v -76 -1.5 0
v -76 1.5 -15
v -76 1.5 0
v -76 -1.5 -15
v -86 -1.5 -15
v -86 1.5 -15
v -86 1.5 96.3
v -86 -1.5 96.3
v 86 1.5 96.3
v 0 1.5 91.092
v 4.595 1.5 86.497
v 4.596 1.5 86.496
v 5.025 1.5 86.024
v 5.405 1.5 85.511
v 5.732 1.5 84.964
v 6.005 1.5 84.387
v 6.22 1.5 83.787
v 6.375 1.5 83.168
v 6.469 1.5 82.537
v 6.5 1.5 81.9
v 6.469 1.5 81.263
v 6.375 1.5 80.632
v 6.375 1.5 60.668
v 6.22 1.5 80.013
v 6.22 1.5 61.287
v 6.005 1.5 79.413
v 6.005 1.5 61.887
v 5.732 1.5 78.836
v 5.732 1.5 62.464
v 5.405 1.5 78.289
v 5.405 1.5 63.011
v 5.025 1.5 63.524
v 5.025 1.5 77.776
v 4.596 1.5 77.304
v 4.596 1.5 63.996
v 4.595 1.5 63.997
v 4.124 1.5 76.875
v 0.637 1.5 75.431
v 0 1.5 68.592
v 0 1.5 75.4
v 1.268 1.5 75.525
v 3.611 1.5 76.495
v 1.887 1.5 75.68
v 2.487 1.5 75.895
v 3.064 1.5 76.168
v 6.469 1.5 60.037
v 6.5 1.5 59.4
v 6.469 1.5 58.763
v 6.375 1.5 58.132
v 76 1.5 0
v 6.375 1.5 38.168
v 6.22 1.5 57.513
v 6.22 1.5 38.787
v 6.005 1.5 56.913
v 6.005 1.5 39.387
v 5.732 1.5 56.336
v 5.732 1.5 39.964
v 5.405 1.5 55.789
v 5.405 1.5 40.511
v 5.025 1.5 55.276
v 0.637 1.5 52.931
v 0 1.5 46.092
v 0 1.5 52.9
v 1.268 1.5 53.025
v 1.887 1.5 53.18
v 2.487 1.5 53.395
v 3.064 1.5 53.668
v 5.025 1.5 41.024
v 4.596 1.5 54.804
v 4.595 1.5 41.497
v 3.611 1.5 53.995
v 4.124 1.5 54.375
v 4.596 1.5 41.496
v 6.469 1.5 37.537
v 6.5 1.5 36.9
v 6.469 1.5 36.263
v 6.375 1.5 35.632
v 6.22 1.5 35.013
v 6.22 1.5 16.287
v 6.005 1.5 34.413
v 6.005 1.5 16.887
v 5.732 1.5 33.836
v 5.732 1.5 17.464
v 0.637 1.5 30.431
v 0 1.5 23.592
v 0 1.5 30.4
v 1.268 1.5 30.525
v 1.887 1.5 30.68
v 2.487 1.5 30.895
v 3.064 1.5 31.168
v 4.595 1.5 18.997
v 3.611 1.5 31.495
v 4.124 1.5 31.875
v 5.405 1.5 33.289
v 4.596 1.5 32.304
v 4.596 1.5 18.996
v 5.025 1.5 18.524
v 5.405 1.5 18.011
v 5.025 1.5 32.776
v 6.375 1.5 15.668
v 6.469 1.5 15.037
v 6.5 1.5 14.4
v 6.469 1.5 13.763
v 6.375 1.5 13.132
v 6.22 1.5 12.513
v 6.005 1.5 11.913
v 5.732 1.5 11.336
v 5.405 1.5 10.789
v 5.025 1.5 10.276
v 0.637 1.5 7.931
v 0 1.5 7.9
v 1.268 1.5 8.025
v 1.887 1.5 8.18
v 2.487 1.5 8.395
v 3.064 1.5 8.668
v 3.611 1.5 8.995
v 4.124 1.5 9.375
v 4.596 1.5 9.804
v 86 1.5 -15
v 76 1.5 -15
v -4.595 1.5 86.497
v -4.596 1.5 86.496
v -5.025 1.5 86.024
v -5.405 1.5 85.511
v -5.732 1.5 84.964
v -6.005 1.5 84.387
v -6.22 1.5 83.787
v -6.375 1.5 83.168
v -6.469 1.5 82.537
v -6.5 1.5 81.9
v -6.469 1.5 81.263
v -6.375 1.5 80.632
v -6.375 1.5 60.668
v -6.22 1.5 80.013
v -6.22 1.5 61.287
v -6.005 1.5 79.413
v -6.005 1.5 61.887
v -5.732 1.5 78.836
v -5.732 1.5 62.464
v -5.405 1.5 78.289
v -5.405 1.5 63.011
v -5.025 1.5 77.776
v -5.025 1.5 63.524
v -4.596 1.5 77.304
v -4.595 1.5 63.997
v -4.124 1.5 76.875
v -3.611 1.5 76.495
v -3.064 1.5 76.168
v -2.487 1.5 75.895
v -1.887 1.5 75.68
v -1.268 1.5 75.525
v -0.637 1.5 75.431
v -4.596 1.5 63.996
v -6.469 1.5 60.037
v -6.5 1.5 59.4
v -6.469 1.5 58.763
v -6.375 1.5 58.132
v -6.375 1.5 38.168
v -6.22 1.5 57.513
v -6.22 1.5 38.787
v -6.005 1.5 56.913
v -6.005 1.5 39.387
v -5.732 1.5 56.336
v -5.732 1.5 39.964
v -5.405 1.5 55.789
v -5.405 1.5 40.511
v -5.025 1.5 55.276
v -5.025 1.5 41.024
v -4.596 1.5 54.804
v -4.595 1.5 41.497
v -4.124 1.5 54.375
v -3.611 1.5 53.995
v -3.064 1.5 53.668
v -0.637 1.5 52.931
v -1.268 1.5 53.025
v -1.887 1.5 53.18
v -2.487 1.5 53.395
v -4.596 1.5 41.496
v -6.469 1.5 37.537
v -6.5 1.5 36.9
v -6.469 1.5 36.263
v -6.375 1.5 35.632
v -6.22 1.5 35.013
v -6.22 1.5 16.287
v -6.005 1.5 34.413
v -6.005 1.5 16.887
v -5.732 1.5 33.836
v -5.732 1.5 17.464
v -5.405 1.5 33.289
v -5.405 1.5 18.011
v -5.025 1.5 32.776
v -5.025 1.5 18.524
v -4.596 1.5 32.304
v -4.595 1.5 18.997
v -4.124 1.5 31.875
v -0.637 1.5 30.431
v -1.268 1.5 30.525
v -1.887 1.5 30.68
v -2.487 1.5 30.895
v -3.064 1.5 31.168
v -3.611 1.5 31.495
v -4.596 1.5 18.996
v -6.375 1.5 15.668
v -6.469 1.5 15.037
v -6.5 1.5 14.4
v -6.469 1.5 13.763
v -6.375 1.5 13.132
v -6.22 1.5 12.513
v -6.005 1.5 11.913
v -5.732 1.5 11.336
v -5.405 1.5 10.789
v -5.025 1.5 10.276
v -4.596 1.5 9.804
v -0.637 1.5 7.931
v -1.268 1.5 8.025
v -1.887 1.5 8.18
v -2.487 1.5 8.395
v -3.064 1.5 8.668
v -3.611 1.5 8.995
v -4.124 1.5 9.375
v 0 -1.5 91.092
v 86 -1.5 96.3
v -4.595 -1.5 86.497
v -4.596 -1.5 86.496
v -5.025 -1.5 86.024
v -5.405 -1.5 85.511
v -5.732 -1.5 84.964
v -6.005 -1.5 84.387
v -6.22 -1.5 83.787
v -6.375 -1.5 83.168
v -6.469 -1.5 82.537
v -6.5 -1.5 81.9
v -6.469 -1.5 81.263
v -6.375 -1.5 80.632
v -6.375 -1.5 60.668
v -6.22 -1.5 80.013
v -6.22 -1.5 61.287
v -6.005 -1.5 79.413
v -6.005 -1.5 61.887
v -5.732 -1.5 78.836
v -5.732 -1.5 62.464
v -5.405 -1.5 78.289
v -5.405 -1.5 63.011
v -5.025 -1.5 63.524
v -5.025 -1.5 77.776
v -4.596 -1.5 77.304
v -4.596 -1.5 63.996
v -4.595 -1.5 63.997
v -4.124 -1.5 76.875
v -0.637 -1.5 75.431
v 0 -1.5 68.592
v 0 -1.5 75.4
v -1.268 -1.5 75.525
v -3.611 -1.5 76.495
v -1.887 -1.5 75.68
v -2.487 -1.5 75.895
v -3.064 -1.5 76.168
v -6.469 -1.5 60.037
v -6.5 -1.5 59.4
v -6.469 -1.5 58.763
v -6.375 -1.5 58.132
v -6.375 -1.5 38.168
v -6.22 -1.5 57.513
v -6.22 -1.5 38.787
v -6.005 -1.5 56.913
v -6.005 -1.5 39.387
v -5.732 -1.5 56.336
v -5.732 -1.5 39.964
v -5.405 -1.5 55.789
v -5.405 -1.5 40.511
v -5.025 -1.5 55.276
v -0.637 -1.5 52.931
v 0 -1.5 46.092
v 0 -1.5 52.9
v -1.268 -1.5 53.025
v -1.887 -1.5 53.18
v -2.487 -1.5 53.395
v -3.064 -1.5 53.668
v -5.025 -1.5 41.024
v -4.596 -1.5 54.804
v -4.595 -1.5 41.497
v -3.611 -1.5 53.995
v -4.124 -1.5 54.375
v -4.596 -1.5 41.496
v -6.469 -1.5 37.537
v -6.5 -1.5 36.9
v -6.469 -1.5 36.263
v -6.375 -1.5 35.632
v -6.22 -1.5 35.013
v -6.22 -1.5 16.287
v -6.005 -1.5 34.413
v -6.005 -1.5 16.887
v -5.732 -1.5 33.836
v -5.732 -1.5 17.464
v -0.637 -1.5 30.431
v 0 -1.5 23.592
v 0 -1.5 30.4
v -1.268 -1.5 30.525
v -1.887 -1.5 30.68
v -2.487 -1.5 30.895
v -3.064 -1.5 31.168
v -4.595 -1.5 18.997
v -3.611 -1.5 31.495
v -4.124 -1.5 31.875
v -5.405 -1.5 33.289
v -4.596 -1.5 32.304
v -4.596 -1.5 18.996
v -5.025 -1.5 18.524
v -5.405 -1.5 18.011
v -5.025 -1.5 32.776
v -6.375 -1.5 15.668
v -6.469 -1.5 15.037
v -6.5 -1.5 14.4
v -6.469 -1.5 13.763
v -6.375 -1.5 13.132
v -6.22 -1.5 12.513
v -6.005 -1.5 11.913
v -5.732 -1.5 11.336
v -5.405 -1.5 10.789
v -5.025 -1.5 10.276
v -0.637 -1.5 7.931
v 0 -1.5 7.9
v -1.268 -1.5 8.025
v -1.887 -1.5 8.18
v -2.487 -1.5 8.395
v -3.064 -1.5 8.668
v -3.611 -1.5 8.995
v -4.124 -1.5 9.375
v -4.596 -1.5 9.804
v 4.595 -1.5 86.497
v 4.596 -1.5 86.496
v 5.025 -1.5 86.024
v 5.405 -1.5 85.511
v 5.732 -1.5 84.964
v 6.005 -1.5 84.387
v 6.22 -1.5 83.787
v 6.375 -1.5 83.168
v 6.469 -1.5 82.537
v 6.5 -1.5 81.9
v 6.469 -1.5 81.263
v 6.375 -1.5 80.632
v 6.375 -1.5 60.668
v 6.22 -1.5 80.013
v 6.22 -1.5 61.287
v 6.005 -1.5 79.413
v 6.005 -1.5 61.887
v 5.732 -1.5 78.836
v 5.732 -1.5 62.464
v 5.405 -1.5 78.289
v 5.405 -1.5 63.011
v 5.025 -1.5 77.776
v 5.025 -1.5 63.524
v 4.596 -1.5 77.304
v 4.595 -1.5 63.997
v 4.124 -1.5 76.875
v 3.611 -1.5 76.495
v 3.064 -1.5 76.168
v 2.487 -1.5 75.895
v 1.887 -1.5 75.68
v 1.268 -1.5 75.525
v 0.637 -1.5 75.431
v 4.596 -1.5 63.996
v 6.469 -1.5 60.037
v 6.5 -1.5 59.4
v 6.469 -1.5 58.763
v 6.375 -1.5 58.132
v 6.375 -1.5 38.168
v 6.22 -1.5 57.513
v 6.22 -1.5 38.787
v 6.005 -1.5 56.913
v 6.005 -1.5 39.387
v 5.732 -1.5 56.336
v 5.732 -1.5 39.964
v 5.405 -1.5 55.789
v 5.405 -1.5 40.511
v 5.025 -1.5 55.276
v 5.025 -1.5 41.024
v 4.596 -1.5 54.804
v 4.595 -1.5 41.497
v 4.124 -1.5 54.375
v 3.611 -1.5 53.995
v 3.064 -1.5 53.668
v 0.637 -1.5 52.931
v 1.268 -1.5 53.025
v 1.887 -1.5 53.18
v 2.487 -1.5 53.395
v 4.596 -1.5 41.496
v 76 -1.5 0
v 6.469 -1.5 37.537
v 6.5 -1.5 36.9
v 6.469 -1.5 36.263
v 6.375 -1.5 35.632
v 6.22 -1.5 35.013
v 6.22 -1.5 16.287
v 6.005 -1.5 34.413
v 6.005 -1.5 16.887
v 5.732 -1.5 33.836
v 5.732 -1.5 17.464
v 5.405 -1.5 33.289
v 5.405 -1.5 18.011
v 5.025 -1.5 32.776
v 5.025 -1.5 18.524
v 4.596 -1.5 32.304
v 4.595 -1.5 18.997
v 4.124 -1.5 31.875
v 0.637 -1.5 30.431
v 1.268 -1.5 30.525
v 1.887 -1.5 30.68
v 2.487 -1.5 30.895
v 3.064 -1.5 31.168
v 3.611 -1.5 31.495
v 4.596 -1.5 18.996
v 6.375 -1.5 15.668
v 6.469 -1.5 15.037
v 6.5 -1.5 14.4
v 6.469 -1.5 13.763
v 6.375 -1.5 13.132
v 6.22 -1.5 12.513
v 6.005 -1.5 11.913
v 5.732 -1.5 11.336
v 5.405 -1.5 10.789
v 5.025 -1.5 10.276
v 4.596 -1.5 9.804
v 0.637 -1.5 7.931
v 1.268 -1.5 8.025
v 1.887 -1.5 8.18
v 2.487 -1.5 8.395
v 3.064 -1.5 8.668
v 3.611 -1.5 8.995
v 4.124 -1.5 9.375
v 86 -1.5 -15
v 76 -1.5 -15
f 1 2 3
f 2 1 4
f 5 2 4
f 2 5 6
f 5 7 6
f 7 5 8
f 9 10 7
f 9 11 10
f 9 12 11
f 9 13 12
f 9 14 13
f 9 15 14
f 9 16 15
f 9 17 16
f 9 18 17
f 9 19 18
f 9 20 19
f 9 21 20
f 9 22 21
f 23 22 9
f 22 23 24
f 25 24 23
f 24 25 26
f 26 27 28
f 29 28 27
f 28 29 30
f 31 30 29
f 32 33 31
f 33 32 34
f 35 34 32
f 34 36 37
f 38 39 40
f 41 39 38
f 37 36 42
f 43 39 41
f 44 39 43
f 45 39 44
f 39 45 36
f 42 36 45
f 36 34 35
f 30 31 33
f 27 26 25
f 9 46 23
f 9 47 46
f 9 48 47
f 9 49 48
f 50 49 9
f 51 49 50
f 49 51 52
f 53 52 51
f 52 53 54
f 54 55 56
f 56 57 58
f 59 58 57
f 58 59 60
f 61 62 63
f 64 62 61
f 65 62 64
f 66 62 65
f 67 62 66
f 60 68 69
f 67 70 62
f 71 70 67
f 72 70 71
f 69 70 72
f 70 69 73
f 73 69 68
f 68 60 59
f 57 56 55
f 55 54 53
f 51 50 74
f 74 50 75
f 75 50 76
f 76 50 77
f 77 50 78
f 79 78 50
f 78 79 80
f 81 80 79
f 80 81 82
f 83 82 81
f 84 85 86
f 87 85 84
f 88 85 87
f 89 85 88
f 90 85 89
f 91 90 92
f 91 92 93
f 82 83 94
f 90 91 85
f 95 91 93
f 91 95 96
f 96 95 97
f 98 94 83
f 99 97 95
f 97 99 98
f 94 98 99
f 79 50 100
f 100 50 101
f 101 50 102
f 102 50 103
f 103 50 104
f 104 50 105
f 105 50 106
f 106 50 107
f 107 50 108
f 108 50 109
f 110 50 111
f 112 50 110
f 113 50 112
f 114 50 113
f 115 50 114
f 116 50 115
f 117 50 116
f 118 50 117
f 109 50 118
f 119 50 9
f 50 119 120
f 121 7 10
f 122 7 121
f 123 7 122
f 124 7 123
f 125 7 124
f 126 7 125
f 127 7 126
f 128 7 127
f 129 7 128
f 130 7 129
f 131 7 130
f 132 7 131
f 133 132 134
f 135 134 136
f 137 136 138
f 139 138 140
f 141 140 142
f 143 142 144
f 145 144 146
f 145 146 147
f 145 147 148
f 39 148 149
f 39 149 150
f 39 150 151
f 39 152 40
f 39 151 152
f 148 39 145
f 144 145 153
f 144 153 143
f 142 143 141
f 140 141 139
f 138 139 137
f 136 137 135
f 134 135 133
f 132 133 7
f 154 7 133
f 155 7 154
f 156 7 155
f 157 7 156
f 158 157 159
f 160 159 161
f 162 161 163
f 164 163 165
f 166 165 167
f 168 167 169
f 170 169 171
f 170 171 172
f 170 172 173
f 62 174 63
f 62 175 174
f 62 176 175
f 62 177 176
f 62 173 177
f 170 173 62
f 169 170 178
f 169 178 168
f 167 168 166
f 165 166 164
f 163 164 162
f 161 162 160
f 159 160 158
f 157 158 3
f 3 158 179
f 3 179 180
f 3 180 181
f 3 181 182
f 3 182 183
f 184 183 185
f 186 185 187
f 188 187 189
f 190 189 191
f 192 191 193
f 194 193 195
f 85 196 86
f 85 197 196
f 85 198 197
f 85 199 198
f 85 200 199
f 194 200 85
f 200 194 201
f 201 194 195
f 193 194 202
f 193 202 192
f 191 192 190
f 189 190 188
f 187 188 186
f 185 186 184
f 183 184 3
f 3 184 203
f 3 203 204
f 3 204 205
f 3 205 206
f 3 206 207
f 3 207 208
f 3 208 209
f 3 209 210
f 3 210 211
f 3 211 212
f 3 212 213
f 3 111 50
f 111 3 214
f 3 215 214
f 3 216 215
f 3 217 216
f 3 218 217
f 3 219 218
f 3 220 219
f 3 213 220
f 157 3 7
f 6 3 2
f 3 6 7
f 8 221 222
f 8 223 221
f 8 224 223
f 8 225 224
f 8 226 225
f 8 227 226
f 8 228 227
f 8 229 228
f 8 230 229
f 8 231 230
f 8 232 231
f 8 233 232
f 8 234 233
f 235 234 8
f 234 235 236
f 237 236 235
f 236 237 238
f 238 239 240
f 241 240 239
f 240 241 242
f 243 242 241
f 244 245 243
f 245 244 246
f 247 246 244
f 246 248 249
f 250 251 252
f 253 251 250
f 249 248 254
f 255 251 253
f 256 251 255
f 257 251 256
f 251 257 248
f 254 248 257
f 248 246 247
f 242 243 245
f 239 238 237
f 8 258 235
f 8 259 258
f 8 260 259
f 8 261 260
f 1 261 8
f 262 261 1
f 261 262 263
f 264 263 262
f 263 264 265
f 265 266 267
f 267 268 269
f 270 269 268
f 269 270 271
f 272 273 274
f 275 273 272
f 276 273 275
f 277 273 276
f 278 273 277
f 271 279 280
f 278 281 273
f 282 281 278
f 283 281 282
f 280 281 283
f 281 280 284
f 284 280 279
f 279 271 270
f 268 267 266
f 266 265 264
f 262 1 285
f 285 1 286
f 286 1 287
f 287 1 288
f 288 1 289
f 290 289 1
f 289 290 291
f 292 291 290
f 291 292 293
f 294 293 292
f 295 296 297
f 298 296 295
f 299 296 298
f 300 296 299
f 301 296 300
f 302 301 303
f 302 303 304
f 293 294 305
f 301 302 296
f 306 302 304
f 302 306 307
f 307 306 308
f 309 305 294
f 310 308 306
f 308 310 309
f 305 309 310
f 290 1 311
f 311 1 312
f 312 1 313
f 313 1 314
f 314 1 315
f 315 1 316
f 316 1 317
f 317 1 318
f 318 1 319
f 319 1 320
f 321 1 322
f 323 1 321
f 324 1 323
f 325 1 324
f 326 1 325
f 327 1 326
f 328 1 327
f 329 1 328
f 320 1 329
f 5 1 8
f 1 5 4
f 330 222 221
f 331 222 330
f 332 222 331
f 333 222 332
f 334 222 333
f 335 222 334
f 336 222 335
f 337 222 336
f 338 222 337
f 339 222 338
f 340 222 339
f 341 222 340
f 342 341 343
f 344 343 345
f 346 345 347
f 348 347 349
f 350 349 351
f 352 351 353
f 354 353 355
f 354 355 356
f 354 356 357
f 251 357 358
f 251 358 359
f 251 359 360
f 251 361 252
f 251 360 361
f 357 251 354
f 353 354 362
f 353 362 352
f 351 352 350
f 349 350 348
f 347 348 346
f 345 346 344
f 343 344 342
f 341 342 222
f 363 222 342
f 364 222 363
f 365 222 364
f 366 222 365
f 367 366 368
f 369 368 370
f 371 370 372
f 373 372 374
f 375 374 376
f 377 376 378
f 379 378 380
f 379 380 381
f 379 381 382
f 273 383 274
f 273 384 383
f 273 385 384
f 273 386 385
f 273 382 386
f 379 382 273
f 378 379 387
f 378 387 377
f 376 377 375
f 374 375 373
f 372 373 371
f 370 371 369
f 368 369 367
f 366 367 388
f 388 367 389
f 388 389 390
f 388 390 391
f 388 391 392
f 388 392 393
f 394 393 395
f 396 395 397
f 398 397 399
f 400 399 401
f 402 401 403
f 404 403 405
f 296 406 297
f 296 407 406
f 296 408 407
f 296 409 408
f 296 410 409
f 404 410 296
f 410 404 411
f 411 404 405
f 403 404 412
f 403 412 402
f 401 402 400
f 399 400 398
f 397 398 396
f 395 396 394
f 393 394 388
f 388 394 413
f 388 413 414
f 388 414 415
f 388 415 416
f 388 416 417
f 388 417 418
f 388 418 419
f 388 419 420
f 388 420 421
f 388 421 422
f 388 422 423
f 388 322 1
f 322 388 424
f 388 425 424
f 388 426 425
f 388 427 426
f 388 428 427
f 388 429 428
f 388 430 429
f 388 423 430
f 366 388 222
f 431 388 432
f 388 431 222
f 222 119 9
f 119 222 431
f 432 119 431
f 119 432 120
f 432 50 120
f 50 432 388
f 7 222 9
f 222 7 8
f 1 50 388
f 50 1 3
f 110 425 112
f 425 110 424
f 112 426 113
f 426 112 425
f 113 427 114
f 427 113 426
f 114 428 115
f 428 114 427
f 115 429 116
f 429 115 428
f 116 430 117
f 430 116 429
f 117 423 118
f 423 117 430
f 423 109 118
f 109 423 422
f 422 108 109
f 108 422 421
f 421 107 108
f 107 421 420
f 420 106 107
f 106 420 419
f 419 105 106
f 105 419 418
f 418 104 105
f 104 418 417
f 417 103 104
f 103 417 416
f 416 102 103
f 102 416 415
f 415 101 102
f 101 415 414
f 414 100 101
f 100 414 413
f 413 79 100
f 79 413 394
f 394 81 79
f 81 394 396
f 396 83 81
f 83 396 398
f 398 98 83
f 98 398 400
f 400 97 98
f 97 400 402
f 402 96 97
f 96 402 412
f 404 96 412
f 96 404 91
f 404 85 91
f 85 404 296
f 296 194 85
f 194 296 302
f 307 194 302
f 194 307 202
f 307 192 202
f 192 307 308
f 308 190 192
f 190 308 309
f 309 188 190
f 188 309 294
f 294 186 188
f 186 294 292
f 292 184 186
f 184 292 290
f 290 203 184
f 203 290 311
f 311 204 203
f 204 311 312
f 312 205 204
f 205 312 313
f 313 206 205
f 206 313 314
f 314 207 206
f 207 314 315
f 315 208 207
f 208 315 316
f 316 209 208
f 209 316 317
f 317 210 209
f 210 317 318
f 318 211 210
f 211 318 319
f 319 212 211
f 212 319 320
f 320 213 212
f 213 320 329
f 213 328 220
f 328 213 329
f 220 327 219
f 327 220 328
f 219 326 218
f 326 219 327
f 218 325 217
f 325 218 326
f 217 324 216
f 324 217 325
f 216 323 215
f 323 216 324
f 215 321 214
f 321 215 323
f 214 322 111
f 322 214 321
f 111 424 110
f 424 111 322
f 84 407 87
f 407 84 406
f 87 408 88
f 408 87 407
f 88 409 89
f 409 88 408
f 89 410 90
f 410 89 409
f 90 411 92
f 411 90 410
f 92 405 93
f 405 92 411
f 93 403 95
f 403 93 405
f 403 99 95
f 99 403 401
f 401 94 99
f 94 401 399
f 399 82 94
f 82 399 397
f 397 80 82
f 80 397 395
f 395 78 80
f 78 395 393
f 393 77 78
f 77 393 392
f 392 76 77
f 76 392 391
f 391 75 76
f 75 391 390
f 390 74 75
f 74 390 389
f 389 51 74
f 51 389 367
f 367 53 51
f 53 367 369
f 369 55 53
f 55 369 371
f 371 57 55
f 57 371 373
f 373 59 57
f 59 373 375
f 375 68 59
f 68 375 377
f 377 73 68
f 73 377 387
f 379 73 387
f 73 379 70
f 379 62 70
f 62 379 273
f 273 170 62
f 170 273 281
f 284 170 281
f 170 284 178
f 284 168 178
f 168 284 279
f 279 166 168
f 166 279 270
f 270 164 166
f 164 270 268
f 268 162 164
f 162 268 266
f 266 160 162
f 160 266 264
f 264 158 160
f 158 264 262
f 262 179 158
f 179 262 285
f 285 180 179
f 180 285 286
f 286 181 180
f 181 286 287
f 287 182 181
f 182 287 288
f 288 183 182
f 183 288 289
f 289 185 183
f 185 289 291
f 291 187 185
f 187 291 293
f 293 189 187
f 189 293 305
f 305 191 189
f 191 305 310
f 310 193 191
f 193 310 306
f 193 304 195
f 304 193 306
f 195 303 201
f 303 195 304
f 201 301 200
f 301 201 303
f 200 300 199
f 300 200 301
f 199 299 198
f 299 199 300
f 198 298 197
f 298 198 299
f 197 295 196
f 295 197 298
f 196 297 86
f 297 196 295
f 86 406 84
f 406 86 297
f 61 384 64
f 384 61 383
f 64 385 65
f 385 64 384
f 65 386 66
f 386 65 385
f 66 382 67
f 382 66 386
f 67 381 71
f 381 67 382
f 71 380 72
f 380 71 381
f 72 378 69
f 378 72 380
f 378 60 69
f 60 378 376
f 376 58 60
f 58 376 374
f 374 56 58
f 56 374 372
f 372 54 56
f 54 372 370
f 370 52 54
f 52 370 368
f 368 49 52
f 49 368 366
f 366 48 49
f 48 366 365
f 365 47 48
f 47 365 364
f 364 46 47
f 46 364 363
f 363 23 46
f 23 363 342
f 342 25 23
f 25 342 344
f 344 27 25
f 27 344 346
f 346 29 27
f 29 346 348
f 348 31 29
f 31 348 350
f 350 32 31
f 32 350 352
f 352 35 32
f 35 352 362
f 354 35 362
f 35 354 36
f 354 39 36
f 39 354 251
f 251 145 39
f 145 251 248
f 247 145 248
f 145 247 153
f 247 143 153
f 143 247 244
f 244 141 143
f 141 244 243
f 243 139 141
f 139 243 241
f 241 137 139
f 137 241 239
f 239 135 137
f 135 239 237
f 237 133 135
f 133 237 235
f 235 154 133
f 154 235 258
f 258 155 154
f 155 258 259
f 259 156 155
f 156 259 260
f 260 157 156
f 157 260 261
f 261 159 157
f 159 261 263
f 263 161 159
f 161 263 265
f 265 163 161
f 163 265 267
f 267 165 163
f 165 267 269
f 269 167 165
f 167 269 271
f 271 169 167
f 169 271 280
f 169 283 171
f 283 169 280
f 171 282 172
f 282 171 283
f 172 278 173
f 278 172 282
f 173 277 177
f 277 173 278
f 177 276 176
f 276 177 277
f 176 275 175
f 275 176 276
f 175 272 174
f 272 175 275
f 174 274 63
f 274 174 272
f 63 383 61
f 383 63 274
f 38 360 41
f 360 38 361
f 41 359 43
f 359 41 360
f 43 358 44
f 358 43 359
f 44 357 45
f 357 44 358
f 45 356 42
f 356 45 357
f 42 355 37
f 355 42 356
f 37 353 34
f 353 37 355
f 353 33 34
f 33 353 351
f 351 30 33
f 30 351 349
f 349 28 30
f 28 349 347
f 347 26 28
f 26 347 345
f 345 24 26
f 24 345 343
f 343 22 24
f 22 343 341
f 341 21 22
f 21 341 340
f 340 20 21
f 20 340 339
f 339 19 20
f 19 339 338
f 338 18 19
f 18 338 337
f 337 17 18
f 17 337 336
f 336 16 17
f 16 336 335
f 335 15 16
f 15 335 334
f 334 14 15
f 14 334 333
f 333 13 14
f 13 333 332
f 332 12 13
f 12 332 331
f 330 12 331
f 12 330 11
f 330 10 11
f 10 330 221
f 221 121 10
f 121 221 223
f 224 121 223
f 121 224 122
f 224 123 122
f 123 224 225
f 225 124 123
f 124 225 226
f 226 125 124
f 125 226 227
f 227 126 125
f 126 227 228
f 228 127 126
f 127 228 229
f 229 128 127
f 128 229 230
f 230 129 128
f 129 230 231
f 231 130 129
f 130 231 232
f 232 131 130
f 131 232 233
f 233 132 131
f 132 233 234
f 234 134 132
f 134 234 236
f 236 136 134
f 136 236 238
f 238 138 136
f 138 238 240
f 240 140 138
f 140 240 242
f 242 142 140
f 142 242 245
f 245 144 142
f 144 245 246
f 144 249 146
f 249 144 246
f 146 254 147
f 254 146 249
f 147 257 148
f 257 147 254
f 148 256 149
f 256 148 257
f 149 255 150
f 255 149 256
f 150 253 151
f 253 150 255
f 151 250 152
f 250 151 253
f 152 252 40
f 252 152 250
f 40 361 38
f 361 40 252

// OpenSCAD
// file: common.scad
// ============================================================
// common.scad — shared parameters + modules for all designs
// LOCKED PEN SPECIFICATION (do not change)
// ============================================================
PEN_L = 165;      // pen length (mm)
PEN_A = 17;       // pen cross-section minor
PEN_B = 20;       // pen cross-section major (used as diameter envelope)
CLEAR = 0.4;      // fit clearance
WALL  = 1.6;      // minimum wall thickness

$fn = 64;

RCH = PEN_B/2 + CLEAR;   // = 10.4  channel radius
EPS = 0.01;

// --- open-top U trough cut, axis along X, centered at local origin -----------
// Removes a lower half-cylinder of radius r plus a full-width vertical slot
// upward, so the channel is open at the top (no ceiling -> no overhang).
module trough_cut(len, r=RCH, top=80) {
    union() {
        rotate([0,90,0]) cylinder(h=len, r=r, center=true);
        translate([0,0,top/2]) cube([len, 2*r, top], center=true); // slot upward
    }
}

// --- teardrop hole, axis along X, centered at local origin --------------------
// 45-degree self-supporting apex pointing +Z so a horizontal bore can print
// without support.
module teardrop_cut(len, r=RCH) {
    rotate([0,90,0])
        linear_extrude(height=len, center=true)
            union() {
                circle(r=r);
                polygon([[ 0.7071*r, 0.7071*r],
                         [ 0,         1.4142*r],
                         [-0.7071*r,  0.7071*r]]);
            }
}

// --- dial relief: widened open-top pocket at one channel end -----------------
// place at the +X or -X end of a channel so the dose dial clears / can be turned
module dial_relief(end_x, r=RCH+2.2, len=28, top=80) {
    translate([end_x, 0, 0]) trough_cut(len, r, top);
}
// file: gate_lib.scad
// gate_lib.scad — two-part front-removable rack: open cradle BODY + lift-off GATE
// The body is a reclined ramp with open grooves; pens pull straight out the
// front. A slim gate drops into a catch at each end and spans the front, blocking
// the pens until you lift it off. Everything is a loose/positive fit -> nothing
// tolerance-critical, no snap, no test print.
include <common.scad>

LBLK = PEN_L + 7;     // 172 body length
GTH  = 3.0;           // gate thickness
GCL  = 0.6;           // generous clearance for the gate-to-catch fit
TABW = 10;            // gate end-tab width (along X)

// ---- shared layout ---------------------------------------------------------
function _yc(n,P,phi,i) = (-(n-1)/2 + i) * P * cos(phi);
function _zc(n,P,phi,i) = (WALL + RCH) + i * P * sin(phi);
function _ymn(n,P,phi)  = _yc(n,P,phi,0)   - RCH - WALL;
function _ymx(n,P,phi)  = _yc(n,P,phi,n-1) + RCH + WALL;
function _Hb(n,P,phi)   = _zc(n,P,phi,n-1) + RCH + 10;
// up-slope length of the ramp face (gate height when printed standing)
function _faceL(n,P)    = (n-1)*P + 2*RCH + 8;

// 2D teardrop (45deg apex toward +Y) for self-supporting windows
module _td2d(r) {
    union() {
        circle(r=r);
        polygon([[0.7071*r,0.7071*r],[0,1.4142*r],[-0.7071*r,0.7071*r]]);
    }
}

// ===================== BODY (prints in this orientation) ====================
module body(n=4, phi=52, P=22.5, lip=2.0, rr=RCH+2, rlen=34) {
    cph=cos(phi); sph=sin(phi);
    yc=[for(i=[0:n-1]) _yc(n,P,phi,i)];
    zc=[for(i=[0:n-1]) _zc(n,P,phi,i)];
    ymn=_ymn(n,P,phi); ymx=_ymx(n,P,phi);
    Wb=ymx-ymn; ycen=(ymx+ymn)/2; Hb=_Hb(n,P,phi);
    relief_cx=LBLK/2-12; big=800;
    cxtab = LBLK/2 - TABW/2;     // catch sits just inside each end

    difference() {
        union() {
            // sheared wedge
            difference() {
                translate([0,ycen,Hb/2]) cube([LBLK,Wb,Hb],center=true);
                translate([0,yc[0],zc[0]+lip]) rotate([phi,0,0])
                    translate([0,0,big/2]) cube([LBLK+2,big,big],center=true);
            }
            // two end CATCHES: posts at the front-bottom corners with an
            // up-slope-open pocket the gate end-tab drops into
            for (sx=[-1,1])
                translate([sx*cxtab, ymn - GTH - GCL, 0])
                    catch_post(phi);
        }
        // open grooves (pen pulls out the front) + dial relief
        for (i=[0:n-1]) {
            translate([0,yc[i],zc[i]]) rotate([0,90,0]) cylinder(h=LBLK+2,r=RCH,center=true);
            translate([relief_cx,yc[i],zc[i]]) rotate([0,90,0]) cylinder(h=rlen,r=rr,center=true);
        }
        // pocket inside each catch (the slot the gate tab sits in)
        for (sx=[-1,1])
            translate([sx*cxtab, ymn - GTH/2, 0])
                catch_slot();
    }
}

module catch_post(phi) {
    // a small block in front of the ramp toe, tall enough to hold the gate
    translate([0,0,18/2]) cube([TABW, GTH+2, 18], center=true);
}
module catch_slot() {
    // open-topped slot the gate end-tab drops into (loose fit)
    translate([0,0,30]) cube([TABW+2*GCL, GTH+2*GCL, 60], center=true);
}

// ===================== GATE (authored STANDING for printing) ================
// Printed as a thin upright wall: X = length, Z = ramp-face height, Y = thickness
module gate(n=4, phi=52, P=22.5, rwin=6.5) {
    faceL=_faceL(n,P);
    difference() {
        union() {
            // main panel
            translate([0,0,faceL/2]) cube([LBLK, GTH, faceL], center=true);
            // two end tabs that drop into the body catches (extend below panel)
            for (sx=[-1,1])
                translate([sx*(LBLK/2 - TABW/2), 0, -7])
                    cube([TABW, GTH, 16], center=true);
        }
        // grab windows aligned to each pen's up-slope position
        for (i=[0:n-1])
            translate([0, 0, RCH + 4 + i*P])
                rotate([90,0,0]) linear_extrude(height=GTH+2, center=true) _td2d(rwin);
    }
}
// main file
// f3 gate — lift-off front retainer (printed standing).
include <gate_lib.scad>
gate(n=4, phi=68, P=22.5);
